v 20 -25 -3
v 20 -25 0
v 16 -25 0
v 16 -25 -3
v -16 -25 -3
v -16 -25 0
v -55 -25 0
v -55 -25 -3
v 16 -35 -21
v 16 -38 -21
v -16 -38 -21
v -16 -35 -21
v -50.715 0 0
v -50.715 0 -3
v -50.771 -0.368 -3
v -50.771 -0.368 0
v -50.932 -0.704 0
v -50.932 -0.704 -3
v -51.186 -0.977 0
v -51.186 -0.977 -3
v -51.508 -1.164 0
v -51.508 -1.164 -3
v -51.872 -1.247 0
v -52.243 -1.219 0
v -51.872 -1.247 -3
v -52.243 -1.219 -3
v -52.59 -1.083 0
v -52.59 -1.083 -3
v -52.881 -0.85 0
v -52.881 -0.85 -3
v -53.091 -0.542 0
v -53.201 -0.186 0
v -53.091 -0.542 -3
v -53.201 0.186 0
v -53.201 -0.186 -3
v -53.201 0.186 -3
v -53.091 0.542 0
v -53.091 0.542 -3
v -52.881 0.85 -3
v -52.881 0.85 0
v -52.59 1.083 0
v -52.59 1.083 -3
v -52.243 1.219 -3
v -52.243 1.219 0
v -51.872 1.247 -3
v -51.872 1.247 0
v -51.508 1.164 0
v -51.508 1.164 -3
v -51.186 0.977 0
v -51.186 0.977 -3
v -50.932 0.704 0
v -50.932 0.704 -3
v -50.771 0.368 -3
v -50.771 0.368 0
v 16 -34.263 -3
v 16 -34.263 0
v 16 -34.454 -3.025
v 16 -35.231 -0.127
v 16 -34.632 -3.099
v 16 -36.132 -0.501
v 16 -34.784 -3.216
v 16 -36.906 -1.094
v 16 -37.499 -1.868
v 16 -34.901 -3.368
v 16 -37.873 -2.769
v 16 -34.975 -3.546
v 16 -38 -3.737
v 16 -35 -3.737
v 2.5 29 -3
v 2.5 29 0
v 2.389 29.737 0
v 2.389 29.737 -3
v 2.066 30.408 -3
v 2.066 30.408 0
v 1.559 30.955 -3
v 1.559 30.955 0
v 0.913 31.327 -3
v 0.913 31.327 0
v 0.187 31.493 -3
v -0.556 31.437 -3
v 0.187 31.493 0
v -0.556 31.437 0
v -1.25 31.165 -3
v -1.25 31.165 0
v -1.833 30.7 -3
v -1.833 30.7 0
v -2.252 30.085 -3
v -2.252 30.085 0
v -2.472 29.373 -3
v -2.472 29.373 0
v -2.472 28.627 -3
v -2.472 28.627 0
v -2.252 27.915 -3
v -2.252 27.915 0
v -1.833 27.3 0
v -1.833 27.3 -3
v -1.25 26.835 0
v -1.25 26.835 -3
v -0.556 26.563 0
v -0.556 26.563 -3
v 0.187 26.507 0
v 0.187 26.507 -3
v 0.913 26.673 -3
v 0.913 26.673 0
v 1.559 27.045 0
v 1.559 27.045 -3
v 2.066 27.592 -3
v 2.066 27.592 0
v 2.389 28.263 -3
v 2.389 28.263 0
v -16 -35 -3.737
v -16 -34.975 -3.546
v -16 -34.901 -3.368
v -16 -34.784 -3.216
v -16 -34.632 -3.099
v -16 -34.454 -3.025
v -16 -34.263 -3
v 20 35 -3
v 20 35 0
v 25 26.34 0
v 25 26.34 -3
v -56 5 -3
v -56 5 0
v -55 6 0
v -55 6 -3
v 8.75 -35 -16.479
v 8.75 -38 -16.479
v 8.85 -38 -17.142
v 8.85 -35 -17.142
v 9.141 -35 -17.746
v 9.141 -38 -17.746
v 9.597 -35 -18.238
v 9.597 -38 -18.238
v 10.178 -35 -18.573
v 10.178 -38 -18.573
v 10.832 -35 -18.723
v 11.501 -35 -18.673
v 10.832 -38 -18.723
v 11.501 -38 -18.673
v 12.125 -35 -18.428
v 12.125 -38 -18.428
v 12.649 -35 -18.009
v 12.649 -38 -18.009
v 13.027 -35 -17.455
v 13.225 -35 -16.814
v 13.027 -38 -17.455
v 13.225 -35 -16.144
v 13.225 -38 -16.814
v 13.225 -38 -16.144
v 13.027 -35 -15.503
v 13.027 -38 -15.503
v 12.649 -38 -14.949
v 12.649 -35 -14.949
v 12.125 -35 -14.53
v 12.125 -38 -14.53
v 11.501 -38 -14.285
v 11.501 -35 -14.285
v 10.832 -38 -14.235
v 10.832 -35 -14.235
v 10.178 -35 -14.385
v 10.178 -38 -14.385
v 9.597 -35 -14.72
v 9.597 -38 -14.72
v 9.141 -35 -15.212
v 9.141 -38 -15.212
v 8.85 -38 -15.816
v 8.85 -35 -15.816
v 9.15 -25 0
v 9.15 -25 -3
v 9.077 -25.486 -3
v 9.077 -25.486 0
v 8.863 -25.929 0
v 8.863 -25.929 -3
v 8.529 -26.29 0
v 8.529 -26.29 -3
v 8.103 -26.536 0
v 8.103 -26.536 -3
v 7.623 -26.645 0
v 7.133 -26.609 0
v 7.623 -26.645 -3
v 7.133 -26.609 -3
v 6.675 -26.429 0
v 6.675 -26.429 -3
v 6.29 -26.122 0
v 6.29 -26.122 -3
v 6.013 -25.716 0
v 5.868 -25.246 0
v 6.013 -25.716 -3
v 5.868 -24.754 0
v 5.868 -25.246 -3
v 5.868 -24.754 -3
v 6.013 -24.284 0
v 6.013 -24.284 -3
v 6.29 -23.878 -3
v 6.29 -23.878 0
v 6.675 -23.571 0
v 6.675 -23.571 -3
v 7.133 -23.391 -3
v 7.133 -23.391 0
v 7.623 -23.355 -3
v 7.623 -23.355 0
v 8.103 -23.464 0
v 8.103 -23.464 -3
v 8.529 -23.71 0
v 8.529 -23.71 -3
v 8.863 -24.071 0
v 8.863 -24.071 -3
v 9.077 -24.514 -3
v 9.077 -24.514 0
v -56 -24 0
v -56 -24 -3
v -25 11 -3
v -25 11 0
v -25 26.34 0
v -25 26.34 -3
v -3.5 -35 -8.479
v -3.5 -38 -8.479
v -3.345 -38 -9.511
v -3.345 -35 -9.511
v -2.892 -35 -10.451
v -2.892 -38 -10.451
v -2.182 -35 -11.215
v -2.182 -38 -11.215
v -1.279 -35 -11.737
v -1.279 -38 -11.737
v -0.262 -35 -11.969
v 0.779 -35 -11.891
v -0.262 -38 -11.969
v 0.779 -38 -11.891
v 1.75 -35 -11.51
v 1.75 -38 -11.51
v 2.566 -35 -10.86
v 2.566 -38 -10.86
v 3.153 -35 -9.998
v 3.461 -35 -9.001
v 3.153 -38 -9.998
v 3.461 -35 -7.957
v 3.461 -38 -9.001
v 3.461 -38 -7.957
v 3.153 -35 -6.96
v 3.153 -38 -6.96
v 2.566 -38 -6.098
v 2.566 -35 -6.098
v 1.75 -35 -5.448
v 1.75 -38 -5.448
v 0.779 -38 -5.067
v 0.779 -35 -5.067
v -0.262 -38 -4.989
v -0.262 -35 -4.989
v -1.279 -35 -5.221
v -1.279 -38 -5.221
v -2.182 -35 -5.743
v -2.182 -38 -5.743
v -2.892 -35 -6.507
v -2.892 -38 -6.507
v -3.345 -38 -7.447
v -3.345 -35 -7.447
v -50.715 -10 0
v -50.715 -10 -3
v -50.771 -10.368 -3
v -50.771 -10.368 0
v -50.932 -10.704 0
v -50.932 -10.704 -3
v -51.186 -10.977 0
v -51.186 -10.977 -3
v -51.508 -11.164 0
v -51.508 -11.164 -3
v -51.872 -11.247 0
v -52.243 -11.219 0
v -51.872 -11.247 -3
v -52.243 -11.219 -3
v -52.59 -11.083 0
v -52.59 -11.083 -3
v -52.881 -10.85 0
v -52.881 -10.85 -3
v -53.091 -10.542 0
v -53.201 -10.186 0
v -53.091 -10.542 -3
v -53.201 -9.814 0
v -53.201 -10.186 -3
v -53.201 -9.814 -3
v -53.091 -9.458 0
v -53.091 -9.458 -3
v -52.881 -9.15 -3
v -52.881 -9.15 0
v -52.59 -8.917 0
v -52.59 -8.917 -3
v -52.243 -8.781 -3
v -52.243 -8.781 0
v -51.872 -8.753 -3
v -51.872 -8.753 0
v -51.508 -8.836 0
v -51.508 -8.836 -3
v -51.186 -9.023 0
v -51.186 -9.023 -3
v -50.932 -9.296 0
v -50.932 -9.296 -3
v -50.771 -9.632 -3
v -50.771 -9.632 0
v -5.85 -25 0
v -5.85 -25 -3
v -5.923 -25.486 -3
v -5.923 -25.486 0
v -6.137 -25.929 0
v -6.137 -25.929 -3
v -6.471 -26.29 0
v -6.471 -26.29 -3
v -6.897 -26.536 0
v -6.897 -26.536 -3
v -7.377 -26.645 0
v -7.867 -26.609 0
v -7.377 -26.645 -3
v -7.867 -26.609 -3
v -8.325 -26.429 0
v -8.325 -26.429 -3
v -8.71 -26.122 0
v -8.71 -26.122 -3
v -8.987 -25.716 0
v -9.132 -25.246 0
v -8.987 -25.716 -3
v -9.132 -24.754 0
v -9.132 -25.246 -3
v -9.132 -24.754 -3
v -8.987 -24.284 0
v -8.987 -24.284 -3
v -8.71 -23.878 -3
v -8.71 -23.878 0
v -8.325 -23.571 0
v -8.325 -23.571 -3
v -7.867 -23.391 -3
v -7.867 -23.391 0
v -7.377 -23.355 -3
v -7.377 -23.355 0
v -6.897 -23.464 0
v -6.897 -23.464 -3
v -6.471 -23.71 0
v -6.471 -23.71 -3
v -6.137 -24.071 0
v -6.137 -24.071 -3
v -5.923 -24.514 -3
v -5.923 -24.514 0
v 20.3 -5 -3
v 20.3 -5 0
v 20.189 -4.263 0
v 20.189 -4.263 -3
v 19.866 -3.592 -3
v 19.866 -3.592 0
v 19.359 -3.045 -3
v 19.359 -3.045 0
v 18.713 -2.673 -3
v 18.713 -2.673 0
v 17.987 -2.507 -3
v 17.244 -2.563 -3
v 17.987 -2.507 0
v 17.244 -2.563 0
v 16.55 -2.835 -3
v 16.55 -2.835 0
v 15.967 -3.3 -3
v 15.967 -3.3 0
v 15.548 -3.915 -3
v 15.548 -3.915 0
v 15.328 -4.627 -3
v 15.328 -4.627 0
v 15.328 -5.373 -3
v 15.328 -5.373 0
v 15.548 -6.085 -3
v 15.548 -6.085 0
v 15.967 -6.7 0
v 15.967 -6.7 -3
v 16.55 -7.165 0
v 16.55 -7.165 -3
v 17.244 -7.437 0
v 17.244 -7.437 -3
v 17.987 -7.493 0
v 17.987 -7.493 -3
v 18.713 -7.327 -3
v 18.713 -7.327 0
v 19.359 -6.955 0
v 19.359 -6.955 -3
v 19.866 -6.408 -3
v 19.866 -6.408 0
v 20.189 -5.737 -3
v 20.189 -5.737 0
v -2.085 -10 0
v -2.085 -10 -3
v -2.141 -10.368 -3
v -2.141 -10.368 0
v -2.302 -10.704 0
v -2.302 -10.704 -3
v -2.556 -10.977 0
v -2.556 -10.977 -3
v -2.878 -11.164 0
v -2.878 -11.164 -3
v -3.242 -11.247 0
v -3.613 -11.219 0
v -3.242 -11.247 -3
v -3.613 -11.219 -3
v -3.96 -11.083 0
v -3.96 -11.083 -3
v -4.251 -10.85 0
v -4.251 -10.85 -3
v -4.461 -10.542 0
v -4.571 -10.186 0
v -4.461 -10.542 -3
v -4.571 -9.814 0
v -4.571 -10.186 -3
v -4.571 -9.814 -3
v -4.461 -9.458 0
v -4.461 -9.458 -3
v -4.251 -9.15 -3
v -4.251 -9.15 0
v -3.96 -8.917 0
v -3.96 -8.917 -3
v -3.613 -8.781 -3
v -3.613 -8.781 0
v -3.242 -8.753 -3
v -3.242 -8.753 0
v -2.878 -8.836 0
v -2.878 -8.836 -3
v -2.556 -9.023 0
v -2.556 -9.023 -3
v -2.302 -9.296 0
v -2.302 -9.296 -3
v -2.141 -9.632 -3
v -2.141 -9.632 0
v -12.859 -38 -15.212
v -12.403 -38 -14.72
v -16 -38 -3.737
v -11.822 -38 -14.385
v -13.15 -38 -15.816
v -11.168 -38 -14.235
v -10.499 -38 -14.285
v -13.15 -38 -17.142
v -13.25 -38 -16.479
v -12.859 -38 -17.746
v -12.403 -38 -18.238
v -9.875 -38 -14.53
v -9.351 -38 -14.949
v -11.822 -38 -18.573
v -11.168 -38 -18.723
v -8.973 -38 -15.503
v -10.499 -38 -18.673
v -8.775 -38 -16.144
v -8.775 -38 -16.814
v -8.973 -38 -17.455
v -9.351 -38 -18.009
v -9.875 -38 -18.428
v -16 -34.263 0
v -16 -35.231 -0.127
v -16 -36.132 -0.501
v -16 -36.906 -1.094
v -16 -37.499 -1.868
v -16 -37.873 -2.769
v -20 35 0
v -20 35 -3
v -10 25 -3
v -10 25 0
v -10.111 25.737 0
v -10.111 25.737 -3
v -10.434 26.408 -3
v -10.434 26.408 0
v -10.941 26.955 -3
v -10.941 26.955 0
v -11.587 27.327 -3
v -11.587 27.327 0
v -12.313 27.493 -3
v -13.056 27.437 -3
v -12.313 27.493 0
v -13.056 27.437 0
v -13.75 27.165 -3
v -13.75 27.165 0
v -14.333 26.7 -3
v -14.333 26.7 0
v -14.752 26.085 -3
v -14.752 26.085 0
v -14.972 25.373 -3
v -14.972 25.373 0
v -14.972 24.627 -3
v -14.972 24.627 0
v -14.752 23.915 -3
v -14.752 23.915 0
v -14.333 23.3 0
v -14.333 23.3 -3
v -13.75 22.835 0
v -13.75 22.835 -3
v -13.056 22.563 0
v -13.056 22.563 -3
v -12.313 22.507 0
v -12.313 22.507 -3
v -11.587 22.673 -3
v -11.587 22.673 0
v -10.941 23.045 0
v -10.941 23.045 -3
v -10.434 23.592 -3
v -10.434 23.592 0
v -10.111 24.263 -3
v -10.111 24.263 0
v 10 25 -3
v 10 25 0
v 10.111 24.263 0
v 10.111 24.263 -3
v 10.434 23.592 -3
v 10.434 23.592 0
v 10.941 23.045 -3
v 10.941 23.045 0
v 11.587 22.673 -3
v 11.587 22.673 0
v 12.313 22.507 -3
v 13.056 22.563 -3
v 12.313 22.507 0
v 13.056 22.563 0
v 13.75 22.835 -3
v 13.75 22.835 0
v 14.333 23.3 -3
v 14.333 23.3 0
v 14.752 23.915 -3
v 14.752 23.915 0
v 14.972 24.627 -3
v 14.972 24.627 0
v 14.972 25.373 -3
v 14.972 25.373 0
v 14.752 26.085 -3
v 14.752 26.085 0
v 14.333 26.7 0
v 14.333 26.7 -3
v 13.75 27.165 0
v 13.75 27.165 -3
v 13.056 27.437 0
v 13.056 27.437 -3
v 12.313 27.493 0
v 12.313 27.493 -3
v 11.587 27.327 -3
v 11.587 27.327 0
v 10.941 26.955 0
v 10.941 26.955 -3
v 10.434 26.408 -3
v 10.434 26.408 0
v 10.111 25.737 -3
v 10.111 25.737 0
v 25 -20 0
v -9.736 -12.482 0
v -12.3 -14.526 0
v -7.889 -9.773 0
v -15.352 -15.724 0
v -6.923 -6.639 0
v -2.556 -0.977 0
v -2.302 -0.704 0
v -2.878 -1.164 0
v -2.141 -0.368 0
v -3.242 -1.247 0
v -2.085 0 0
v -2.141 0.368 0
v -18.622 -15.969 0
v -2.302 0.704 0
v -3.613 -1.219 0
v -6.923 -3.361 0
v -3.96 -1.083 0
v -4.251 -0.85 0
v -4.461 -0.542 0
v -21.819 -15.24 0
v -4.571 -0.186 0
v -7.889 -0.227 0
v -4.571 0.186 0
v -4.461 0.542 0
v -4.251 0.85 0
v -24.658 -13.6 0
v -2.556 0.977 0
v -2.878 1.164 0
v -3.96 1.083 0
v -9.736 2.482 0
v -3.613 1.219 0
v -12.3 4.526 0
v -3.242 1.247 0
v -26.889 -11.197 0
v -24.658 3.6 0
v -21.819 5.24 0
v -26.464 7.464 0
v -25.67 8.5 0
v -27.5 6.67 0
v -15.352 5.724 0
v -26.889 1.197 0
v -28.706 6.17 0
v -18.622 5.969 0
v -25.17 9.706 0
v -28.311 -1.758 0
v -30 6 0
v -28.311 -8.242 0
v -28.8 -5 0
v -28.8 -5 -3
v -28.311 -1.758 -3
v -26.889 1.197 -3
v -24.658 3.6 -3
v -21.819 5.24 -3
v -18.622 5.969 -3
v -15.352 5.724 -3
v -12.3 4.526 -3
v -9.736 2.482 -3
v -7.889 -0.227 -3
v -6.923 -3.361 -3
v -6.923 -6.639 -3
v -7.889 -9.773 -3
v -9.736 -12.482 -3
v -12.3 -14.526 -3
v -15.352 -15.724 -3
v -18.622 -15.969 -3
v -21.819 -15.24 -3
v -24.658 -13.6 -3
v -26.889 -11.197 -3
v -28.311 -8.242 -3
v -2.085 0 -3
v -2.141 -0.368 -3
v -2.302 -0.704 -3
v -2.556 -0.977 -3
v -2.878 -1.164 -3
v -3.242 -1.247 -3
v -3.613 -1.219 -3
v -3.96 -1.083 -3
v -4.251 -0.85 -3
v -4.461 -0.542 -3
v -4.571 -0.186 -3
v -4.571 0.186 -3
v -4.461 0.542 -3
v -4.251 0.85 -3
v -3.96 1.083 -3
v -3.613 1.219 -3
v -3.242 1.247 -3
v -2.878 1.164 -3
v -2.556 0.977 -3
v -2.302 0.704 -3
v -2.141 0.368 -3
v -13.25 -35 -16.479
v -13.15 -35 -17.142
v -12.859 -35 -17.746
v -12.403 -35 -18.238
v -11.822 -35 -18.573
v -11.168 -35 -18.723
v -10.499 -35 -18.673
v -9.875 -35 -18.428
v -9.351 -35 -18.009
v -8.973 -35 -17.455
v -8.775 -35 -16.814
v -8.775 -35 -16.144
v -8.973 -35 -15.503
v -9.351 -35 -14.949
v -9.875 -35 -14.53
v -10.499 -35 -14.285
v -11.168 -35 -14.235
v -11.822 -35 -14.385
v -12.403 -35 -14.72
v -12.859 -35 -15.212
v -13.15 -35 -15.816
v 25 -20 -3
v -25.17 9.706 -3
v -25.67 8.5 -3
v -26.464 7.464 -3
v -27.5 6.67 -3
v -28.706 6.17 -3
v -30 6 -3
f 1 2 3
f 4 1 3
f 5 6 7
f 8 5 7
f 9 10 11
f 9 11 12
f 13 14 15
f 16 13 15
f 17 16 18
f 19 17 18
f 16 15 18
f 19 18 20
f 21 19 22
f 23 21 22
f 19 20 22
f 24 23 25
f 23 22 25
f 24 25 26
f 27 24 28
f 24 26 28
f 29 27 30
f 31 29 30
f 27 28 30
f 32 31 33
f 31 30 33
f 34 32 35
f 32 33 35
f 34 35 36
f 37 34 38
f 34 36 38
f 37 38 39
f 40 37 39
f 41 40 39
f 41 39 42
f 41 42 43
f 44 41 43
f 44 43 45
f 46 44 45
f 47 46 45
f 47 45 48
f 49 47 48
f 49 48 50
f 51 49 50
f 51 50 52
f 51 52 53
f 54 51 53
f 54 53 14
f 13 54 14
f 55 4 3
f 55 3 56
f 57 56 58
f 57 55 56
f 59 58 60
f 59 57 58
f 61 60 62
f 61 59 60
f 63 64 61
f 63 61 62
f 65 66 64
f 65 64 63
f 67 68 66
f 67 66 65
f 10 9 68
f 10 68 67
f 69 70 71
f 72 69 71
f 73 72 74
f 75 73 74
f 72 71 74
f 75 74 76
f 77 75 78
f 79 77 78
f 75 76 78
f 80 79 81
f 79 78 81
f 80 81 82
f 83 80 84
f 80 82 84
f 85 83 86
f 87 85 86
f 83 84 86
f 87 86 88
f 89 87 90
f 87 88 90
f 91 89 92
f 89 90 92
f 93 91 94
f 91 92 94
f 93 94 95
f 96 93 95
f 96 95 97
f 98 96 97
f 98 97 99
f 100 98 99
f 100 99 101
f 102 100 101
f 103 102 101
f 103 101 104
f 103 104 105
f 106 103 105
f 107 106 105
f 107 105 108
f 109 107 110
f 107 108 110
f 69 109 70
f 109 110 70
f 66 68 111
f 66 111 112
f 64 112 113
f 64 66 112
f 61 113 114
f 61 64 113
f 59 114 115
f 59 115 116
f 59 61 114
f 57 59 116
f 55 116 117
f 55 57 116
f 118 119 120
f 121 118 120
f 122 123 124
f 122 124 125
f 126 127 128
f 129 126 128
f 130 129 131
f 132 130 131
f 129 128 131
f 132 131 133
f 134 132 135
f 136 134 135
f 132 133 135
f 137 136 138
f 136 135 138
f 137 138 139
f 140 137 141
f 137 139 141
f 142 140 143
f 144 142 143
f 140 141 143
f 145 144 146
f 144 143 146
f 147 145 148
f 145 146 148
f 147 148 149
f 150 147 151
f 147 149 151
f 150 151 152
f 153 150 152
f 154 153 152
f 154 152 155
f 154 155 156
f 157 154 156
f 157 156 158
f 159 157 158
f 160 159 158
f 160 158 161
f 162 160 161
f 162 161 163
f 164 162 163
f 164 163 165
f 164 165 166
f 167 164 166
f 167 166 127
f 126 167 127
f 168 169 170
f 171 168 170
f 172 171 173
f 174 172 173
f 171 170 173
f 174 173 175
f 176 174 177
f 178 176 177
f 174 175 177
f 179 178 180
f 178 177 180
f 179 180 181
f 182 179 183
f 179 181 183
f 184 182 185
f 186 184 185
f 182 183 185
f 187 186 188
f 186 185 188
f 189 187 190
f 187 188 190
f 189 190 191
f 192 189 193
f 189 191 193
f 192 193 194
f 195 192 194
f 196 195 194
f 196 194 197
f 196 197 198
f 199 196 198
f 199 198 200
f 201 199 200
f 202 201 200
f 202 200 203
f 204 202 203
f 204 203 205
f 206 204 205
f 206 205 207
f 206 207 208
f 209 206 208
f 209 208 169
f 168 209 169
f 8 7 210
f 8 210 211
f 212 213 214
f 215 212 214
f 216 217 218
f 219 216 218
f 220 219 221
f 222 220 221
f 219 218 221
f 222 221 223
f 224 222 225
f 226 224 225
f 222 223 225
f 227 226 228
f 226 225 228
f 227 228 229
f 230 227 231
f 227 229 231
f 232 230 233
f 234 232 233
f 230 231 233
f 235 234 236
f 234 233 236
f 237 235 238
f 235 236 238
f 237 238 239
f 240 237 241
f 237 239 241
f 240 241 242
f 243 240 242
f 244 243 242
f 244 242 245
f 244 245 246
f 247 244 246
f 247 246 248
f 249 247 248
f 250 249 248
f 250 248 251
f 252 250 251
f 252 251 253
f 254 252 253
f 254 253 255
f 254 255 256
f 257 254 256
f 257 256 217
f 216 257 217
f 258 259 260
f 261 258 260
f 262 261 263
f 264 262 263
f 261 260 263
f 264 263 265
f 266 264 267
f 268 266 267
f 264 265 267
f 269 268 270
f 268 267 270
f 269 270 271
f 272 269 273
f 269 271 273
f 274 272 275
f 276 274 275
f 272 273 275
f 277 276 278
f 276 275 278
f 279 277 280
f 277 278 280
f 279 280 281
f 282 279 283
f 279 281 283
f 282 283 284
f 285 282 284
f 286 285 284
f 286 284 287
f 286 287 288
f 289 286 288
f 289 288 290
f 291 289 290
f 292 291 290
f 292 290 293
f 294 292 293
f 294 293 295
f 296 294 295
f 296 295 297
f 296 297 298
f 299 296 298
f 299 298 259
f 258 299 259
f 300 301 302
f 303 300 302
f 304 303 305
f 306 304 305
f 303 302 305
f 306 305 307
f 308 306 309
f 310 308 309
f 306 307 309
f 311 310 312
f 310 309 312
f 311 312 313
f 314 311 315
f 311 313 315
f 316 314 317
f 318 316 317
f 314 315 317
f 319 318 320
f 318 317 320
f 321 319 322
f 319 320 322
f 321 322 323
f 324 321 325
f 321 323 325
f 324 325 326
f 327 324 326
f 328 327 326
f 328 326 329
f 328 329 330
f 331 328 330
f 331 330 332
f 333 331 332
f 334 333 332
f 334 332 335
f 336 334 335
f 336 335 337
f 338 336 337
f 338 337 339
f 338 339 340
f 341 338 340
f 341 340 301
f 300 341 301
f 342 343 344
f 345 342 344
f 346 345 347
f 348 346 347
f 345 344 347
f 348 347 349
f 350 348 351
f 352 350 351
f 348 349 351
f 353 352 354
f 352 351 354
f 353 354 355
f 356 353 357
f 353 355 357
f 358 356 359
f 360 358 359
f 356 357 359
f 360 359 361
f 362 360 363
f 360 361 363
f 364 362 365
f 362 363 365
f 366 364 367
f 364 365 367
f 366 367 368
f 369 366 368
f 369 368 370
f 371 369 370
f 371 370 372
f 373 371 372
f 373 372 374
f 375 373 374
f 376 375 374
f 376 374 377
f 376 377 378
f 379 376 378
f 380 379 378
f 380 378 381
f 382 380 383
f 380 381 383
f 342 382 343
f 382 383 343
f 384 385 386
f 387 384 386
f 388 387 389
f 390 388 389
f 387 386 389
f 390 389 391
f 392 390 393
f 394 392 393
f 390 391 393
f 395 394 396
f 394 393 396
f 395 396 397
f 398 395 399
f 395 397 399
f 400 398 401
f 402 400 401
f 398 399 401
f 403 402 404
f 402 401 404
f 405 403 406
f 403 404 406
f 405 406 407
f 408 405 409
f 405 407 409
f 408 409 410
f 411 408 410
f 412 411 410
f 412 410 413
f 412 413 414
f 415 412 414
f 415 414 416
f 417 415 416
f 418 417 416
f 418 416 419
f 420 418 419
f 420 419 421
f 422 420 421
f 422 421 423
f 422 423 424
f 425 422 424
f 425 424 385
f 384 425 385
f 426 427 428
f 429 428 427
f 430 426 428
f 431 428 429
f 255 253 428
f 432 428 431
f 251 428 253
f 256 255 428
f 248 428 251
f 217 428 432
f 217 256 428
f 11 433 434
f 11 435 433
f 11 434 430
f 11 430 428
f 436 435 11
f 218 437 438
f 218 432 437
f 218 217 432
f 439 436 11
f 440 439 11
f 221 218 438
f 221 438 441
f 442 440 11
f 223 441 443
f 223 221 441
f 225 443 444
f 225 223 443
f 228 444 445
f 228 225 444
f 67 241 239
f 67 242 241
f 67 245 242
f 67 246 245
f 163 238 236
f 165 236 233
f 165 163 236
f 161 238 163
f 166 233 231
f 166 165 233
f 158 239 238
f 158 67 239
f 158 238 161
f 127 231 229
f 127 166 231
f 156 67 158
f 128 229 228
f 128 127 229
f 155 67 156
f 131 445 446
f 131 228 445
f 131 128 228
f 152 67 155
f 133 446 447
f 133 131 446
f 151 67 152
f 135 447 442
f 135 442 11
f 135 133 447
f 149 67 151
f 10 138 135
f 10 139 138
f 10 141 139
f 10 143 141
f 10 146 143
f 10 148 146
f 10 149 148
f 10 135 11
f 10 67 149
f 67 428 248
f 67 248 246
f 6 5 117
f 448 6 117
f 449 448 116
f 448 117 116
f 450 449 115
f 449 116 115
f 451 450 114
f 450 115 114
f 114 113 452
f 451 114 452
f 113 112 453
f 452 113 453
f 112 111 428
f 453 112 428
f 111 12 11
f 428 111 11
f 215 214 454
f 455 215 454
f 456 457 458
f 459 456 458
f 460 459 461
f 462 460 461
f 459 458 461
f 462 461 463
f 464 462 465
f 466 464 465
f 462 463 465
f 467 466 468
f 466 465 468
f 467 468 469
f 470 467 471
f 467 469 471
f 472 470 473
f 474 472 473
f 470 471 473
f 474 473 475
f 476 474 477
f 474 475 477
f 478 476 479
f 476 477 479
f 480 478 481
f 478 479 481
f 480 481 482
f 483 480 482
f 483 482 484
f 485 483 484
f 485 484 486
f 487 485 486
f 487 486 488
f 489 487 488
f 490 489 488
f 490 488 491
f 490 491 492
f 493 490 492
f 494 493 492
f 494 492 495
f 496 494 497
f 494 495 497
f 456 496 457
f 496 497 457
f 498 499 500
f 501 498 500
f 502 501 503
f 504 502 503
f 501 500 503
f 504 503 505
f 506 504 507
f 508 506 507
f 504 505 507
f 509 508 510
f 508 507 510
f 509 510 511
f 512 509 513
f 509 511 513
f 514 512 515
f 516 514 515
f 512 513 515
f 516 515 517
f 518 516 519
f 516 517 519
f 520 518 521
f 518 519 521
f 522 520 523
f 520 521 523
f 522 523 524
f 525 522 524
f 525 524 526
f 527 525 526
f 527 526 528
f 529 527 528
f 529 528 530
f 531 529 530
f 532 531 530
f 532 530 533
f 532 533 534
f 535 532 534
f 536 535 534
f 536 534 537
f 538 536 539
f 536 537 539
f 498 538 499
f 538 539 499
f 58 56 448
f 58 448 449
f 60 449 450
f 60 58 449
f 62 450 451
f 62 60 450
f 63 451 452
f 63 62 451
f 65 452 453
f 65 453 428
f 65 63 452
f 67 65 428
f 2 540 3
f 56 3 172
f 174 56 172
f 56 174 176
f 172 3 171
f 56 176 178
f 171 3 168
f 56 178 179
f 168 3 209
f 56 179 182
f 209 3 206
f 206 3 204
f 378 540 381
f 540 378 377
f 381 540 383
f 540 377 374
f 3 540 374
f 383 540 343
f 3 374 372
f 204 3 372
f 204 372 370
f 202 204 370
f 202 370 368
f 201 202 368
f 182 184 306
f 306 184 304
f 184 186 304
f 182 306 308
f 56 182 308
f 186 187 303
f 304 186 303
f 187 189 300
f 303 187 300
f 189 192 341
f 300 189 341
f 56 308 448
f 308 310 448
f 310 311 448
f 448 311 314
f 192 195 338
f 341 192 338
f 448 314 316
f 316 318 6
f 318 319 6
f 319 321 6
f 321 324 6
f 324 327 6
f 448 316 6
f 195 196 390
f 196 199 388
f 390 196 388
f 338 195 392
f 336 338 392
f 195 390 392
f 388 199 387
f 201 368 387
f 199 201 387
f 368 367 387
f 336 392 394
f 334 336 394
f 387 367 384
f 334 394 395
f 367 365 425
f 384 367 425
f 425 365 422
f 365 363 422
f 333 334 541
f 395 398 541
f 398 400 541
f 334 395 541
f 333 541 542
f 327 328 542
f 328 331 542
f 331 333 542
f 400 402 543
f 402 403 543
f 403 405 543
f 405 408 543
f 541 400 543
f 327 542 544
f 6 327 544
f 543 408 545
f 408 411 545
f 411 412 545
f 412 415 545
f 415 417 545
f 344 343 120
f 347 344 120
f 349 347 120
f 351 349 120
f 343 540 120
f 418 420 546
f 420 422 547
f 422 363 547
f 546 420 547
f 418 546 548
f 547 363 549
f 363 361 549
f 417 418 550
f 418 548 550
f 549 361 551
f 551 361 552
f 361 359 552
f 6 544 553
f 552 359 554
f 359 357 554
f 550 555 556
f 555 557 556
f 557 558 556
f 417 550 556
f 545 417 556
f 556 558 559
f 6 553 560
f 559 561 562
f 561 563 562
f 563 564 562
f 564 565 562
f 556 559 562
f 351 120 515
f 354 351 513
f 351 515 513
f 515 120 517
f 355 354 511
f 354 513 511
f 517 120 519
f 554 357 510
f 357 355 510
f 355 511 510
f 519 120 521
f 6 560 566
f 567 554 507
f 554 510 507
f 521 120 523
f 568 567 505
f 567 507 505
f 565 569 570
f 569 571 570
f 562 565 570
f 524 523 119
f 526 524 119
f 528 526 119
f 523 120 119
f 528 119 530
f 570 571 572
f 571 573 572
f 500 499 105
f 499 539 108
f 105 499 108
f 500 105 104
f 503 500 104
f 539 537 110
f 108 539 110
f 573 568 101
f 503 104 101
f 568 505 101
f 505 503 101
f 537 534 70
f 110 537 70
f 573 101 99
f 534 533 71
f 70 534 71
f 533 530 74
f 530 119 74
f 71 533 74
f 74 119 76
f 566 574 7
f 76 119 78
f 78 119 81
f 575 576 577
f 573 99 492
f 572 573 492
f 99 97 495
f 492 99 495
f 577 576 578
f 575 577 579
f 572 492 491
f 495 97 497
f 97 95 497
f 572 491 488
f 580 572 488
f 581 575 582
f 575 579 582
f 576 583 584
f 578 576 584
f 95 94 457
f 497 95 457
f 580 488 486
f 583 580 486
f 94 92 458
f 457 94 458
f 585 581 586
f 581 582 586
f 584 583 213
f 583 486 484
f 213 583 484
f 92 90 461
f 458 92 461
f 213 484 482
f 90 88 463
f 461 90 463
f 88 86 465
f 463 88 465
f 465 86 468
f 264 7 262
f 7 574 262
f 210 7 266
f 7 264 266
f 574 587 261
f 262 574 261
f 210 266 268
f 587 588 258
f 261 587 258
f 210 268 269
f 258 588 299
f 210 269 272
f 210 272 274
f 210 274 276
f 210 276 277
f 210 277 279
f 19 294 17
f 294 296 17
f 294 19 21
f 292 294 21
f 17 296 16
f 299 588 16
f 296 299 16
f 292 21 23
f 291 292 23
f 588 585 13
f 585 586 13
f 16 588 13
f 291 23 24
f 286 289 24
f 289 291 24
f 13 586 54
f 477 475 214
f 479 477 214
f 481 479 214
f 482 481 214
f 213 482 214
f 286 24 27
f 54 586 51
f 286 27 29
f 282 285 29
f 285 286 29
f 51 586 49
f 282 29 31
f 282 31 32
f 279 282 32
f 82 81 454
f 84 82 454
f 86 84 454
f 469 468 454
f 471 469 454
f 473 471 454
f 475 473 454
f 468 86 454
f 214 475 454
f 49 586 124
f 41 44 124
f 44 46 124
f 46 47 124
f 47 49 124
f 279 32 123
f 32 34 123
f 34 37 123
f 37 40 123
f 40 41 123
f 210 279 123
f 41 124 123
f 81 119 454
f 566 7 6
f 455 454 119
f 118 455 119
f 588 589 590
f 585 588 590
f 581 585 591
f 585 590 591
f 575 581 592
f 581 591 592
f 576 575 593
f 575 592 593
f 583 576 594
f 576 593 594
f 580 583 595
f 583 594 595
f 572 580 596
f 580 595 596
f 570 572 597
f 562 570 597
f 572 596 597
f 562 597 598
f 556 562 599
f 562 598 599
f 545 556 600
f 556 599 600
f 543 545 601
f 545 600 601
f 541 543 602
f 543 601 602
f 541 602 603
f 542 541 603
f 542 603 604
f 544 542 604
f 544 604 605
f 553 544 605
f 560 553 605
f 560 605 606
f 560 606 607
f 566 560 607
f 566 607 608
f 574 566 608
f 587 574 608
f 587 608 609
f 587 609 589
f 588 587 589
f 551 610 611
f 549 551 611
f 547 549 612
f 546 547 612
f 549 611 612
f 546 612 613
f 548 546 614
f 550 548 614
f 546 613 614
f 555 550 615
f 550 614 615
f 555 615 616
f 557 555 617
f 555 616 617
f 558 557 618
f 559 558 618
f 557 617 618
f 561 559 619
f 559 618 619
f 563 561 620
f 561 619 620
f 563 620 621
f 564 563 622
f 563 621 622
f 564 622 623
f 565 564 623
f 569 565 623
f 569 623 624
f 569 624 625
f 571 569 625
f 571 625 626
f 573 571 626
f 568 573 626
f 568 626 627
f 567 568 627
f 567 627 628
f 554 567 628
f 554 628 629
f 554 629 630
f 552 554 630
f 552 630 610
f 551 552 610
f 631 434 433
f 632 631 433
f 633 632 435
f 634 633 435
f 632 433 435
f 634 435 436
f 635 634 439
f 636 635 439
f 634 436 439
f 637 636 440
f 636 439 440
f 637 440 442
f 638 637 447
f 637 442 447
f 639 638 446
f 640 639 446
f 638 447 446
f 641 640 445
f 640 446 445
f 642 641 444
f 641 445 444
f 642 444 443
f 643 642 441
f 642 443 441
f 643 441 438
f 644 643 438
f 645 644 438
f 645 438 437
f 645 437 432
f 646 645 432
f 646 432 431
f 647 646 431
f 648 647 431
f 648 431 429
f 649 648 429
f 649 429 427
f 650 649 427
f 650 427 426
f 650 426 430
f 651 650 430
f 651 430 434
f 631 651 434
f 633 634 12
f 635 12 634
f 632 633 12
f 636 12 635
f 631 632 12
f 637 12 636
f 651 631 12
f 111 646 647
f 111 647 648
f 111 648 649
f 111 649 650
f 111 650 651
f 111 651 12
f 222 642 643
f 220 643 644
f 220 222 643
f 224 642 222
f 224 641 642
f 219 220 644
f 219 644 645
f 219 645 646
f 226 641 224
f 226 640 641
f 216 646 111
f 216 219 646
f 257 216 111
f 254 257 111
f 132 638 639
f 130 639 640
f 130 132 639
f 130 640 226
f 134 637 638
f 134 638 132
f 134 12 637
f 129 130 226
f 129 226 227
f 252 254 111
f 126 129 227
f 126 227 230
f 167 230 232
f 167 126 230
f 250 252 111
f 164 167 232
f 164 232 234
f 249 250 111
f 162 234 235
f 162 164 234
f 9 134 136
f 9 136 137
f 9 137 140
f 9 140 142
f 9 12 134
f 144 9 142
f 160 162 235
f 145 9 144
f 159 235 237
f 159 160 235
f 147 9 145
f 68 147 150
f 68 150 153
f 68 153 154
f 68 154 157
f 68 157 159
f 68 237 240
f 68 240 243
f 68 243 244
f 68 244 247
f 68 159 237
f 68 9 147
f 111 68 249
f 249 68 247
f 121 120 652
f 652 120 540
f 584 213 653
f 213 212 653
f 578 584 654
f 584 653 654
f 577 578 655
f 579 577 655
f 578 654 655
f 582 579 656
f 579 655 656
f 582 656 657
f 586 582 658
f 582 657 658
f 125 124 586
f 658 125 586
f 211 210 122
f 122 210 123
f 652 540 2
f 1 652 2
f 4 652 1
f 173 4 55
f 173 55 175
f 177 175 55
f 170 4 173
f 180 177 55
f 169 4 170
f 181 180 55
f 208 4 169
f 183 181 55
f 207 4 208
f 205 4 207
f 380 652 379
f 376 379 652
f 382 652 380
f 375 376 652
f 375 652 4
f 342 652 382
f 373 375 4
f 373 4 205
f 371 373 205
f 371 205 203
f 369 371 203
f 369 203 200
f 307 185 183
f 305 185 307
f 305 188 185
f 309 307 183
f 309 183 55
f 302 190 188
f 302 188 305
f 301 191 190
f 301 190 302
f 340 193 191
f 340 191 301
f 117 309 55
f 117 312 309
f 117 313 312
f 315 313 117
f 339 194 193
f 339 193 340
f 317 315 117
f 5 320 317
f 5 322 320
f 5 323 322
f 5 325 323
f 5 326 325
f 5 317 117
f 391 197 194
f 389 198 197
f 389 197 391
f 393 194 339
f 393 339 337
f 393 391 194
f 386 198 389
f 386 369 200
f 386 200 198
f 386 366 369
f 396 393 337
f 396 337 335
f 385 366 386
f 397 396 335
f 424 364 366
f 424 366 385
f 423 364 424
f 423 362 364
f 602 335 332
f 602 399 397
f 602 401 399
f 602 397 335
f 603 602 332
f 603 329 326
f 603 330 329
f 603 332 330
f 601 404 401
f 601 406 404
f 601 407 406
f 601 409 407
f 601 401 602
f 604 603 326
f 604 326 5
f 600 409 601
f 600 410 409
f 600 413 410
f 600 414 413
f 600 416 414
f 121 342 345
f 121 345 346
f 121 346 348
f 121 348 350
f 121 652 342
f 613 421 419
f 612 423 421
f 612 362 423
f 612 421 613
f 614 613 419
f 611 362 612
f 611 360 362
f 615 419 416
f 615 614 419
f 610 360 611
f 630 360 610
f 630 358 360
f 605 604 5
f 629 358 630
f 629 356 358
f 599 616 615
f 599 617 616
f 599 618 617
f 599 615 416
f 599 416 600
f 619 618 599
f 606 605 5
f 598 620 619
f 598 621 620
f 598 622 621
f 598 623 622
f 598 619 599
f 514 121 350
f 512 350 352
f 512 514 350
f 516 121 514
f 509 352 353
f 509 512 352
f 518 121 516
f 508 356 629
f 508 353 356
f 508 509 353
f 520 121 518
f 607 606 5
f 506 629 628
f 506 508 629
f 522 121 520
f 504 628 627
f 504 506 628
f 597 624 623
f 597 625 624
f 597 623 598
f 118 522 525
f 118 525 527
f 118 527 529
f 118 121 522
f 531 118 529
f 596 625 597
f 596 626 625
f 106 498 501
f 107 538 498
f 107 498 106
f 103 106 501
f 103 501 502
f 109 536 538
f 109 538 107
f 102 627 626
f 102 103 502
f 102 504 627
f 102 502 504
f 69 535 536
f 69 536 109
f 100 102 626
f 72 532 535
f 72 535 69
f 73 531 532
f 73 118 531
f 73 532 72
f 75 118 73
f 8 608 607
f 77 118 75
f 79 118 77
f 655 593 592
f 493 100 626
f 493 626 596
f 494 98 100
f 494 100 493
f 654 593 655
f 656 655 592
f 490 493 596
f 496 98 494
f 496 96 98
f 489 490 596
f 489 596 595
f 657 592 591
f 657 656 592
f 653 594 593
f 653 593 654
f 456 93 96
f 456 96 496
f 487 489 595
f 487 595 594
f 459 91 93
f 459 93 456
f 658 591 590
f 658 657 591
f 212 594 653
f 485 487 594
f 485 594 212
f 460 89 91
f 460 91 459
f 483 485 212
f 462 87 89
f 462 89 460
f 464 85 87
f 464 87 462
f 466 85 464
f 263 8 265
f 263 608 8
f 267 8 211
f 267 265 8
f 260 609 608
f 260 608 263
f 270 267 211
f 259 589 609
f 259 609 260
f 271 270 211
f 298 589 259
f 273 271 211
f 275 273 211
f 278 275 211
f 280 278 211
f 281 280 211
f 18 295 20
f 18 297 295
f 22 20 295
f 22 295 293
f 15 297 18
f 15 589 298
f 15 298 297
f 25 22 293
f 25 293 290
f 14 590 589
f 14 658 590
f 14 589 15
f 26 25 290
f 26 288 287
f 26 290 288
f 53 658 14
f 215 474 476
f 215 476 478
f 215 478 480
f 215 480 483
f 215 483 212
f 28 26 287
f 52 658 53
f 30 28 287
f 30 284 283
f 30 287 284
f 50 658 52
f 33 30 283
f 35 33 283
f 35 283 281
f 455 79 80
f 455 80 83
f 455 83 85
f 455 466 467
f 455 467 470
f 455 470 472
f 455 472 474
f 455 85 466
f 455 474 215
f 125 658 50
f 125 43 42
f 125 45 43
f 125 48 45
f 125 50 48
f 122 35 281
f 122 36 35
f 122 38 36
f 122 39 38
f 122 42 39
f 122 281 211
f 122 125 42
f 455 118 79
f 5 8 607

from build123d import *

# Parameters (mm, degrees)
SM_BASE_FLANGE_1_DEPTH           = 3
SKETCH_6_R                       = 2.5
CUT_EXTRUDE_1_DEPTH              = 3
CUT_EXTRUDE_2_REACH              = 68.106
SKETCH_9_R                       = 11
HOLE_WIZARD_M3_1_D               = 2.5
HOLE_WIZARD_M3_1_DEPTH           = 7.5
HOLE_WIZARD_M3_1_TIP             = 0.751075774
SM_EDGE_FLANGE_1_STRIP_W         = 13.4732
SM_EDGE_FLANGE_1_STRIP_H         = 3
SM_EDGE_FLANGE_1_STRIP_CUT_DEPTH = 32
SM_EDGE_FLANGE_1_DEPTH           = 32
HOLE_WIZARD_7_0_7_D              = 7
HOLE_WIZARD_7_0_7_DEPTH          = 6
HOLE_WIZARD_7_0_7_TIP            = 2.103012167
FILLET_1_R                       = 5
CHAMFER_1_SIZE                   = 1
HOLE_WIZARD_4_5_4_5_1_D          = 4.5
HOLE_WIZARD_4_5_4_5_1_DEPTH      = 5
HOLE_WIZARD_4_5_4_5_1_TIP        = 1.351936393
HOLE_WIZARD_M4_1_D               = 3.3
HOLE_WIZARD_M4_1_DEPTH           = 11.5
HOLE_WIZARD_M4_1_TIP             = 0.991420021


# Sheet-metal steps are written as plain solids
with BuildPart() as part:
    # Sketch 1 → 基体-法兰1 (new body)
    with BuildSketch(Plane.XY):
        Polygon((20, -25), (16, -25), (16, -35), (-16, -35), (-16, -25), (-56, -25), (-56, 6), (-25, 6), (-25, 26.339745962), (-20, 35), (20, 35), (25, 26.339745962), (25, -20), align=None)
    extrude(amount=-SM_BASE_FLANGE_1_DEPTH)

    # Sketch 6 → 切除-拉伸1 (cut)
    with BuildSketch(Plane.XY):
        with Locations((-17.8, -5)):
            Circle(SKETCH_6_R)
        with Locations((17.8, -5)):
            Circle(SKETCH_6_R)
        with Locations((0, 29)):
            Circle(SKETCH_6_R)
        with Locations((-12.5, 25)):
            Circle(SKETCH_6_R)
        with Locations(Location((12.5, 25, 0), (0, 0, 180))):
            Circle(SKETCH_6_R)
    extrude(amount=-CUT_EXTRUDE_1_DEPTH, mode=Mode.SUBTRACT)

    # Sketch 9 → 切除-拉伸2 (cut, up to next)
    with BuildSketch(Plane(origin=(0, 0, -3), x_dir=(-1, 0, 0), z_dir=(0, 0, -1)), mode=Mode.PRIVATE) as cut_extrude_2_sk1:
        with Locations((17.8, -5)):
            Circle(SKETCH_9_R)
    cut_extrude_2_tool1 = extrude(cut_extrude_2_sk1.sketch, amount=-CUT_EXTRUDE_2_REACH, mode=Mode.PRIVATE) & part.part
    add(cut_extrude_2_tool1.solids().sort_by_distance((-17.8, -5, -3))[0], mode=Mode.SUBTRACT)

    # M3 螺纹孔1
    with Locations(Plane(origin=(0, -38, 0), x_dir=(-1, 0, 0), z_dir=(0, 0, 1))):
        with Locations((51.965, -38), (51.965, -28), (3.335, -28), (3.335, -38)):
            Hole(HOLE_WIZARD_M3_1_D / 2, depth=HOLE_WIZARD_M3_1_DEPTH)
            with Locations((0, 0, -(HOLE_WIZARD_M3_1_DEPTH + HOLE_WIZARD_M3_1_TIP / 2))):  # 118° drill point
                Cone(0, HOLE_WIZARD_M3_1_D / 2, HOLE_WIZARD_M3_1_TIP, mode=Mode.SUBTRACT)

    # 边线-法兰1 strip (across the edge) → 边线-法兰1 strip cut (cut)
    with BuildSketch(Plane(origin=(16, -35, -3), x_dir=(0, 1, 0), z_dir=(-1, 0, 0))):
        with Locations((-6, -1.5)):
            Rectangle(SM_EDGE_FLANGE_1_STRIP_W, SM_EDGE_FLANGE_1_STRIP_H)
    extrude(amount=SM_EDGE_FLANGE_1_STRIP_CUT_DEPTH, mode=Mode.SUBTRACT)

    # 边线-法兰1 section (across the edge) → 边线-法兰1 (add)
    with BuildSketch(Plane(origin=(16, -35, -3), x_dir=(0, 1, 0), z_dir=(-1, 0, 0))):
        with BuildLine():
            Line((-3, 0.7366), (-3, 18))
            Line((-3, 18), (0, 18))
            Line((0, 18), (0, 0.7366))
            ThreePointArc((0, 0.7366), (0.215745145, 0.215745145), (0.7366, 0))
            Line((0.7366, 0), (0.7366, -3))
            ThreePointArc((0.7366, -3), (-1.905575199, -1.905575199), (-3, 0.7366))
        make_face()
    extrude(amount=SM_EDGE_FLANGE_1_DEPTH)

    # Ø7.0 (7) 直径孔
    with Locations(Plane(origin=(-9.85, -35, 1.271), x_dir=(1, 0, 0), z_dir=(0, 1, 0))):
        with Locations((9.85, 9.75)):
            Hole(HOLE_WIZARD_7_0_7_D / 2, depth=HOLE_WIZARD_7_0_7_DEPTH)
            with Locations((0, 0, -(HOLE_WIZARD_7_0_7_DEPTH + HOLE_WIZARD_7_0_7_TIP / 2))):  # 118° drill point
                Cone(0, HOLE_WIZARD_7_0_7_D / 2, HOLE_WIZARD_7_0_7_TIP, mode=Mode.SUBTRACT)

    # 圆角1
    fillet_1_edges = [part.edges().sort_by_distance(p)[0] for p in [
        (-25, 6, -1.5),
    ]]
    fillet(fillet_1_edges, radius=FILLET_1_R)

    # 倒角1
    chamfer_1_edges = [part.edges().sort_by_distance(p)[0] for p in [
        (-56, -25, -1.5),
        (-56, 6, -1.5),
    ]]
    chamfer(chamfer_1_edges, length=CHAMFER_1_SIZE)

    # Ø4.5 (4.5) 直径孔1
    with Locations(Plane(origin=(-9.85, -35, 1.271), x_dir=(1, 0, 0), z_dir=(0, 1, 0))):
        with Locations((-1.15, 17.75), (20.85, 17.75)):
            Hole(HOLE_WIZARD_4_5_4_5_1_D / 2, depth=HOLE_WIZARD_4_5_4_5_1_DEPTH)
            with Locations((0, 0, -(HOLE_WIZARD_4_5_4_5_1_DEPTH + HOLE_WIZARD_4_5_4_5_1_TIP / 2))):  # 118° drill point
                Cone(0, HOLE_WIZARD_4_5_4_5_1_D / 2, HOLE_WIZARD_4_5_4_5_1_TIP, mode=Mode.SUBTRACT)

    # M4 螺纹孔1
    with Locations(Plane(origin=(-9.85, -49.5, 0), x_dir=(-1, 0, 0), z_dir=(0, 0, 1))):
        with Locations((-2.35, -24.5), (-17.35, -24.5)):
            Hole(HOLE_WIZARD_M4_1_D / 2, depth=HOLE_WIZARD_M4_1_DEPTH)
            with Locations((0, 0, -(HOLE_WIZARD_M4_1_DEPTH + HOLE_WIZARD_M4_1_TIP / 2))):  # 118° drill point
                Cone(0, HOLE_WIZARD_M4_1_D / 2, HOLE_WIZARD_M4_1_TIP, mode=Mode.SUBTRACT)


solid = part.part
